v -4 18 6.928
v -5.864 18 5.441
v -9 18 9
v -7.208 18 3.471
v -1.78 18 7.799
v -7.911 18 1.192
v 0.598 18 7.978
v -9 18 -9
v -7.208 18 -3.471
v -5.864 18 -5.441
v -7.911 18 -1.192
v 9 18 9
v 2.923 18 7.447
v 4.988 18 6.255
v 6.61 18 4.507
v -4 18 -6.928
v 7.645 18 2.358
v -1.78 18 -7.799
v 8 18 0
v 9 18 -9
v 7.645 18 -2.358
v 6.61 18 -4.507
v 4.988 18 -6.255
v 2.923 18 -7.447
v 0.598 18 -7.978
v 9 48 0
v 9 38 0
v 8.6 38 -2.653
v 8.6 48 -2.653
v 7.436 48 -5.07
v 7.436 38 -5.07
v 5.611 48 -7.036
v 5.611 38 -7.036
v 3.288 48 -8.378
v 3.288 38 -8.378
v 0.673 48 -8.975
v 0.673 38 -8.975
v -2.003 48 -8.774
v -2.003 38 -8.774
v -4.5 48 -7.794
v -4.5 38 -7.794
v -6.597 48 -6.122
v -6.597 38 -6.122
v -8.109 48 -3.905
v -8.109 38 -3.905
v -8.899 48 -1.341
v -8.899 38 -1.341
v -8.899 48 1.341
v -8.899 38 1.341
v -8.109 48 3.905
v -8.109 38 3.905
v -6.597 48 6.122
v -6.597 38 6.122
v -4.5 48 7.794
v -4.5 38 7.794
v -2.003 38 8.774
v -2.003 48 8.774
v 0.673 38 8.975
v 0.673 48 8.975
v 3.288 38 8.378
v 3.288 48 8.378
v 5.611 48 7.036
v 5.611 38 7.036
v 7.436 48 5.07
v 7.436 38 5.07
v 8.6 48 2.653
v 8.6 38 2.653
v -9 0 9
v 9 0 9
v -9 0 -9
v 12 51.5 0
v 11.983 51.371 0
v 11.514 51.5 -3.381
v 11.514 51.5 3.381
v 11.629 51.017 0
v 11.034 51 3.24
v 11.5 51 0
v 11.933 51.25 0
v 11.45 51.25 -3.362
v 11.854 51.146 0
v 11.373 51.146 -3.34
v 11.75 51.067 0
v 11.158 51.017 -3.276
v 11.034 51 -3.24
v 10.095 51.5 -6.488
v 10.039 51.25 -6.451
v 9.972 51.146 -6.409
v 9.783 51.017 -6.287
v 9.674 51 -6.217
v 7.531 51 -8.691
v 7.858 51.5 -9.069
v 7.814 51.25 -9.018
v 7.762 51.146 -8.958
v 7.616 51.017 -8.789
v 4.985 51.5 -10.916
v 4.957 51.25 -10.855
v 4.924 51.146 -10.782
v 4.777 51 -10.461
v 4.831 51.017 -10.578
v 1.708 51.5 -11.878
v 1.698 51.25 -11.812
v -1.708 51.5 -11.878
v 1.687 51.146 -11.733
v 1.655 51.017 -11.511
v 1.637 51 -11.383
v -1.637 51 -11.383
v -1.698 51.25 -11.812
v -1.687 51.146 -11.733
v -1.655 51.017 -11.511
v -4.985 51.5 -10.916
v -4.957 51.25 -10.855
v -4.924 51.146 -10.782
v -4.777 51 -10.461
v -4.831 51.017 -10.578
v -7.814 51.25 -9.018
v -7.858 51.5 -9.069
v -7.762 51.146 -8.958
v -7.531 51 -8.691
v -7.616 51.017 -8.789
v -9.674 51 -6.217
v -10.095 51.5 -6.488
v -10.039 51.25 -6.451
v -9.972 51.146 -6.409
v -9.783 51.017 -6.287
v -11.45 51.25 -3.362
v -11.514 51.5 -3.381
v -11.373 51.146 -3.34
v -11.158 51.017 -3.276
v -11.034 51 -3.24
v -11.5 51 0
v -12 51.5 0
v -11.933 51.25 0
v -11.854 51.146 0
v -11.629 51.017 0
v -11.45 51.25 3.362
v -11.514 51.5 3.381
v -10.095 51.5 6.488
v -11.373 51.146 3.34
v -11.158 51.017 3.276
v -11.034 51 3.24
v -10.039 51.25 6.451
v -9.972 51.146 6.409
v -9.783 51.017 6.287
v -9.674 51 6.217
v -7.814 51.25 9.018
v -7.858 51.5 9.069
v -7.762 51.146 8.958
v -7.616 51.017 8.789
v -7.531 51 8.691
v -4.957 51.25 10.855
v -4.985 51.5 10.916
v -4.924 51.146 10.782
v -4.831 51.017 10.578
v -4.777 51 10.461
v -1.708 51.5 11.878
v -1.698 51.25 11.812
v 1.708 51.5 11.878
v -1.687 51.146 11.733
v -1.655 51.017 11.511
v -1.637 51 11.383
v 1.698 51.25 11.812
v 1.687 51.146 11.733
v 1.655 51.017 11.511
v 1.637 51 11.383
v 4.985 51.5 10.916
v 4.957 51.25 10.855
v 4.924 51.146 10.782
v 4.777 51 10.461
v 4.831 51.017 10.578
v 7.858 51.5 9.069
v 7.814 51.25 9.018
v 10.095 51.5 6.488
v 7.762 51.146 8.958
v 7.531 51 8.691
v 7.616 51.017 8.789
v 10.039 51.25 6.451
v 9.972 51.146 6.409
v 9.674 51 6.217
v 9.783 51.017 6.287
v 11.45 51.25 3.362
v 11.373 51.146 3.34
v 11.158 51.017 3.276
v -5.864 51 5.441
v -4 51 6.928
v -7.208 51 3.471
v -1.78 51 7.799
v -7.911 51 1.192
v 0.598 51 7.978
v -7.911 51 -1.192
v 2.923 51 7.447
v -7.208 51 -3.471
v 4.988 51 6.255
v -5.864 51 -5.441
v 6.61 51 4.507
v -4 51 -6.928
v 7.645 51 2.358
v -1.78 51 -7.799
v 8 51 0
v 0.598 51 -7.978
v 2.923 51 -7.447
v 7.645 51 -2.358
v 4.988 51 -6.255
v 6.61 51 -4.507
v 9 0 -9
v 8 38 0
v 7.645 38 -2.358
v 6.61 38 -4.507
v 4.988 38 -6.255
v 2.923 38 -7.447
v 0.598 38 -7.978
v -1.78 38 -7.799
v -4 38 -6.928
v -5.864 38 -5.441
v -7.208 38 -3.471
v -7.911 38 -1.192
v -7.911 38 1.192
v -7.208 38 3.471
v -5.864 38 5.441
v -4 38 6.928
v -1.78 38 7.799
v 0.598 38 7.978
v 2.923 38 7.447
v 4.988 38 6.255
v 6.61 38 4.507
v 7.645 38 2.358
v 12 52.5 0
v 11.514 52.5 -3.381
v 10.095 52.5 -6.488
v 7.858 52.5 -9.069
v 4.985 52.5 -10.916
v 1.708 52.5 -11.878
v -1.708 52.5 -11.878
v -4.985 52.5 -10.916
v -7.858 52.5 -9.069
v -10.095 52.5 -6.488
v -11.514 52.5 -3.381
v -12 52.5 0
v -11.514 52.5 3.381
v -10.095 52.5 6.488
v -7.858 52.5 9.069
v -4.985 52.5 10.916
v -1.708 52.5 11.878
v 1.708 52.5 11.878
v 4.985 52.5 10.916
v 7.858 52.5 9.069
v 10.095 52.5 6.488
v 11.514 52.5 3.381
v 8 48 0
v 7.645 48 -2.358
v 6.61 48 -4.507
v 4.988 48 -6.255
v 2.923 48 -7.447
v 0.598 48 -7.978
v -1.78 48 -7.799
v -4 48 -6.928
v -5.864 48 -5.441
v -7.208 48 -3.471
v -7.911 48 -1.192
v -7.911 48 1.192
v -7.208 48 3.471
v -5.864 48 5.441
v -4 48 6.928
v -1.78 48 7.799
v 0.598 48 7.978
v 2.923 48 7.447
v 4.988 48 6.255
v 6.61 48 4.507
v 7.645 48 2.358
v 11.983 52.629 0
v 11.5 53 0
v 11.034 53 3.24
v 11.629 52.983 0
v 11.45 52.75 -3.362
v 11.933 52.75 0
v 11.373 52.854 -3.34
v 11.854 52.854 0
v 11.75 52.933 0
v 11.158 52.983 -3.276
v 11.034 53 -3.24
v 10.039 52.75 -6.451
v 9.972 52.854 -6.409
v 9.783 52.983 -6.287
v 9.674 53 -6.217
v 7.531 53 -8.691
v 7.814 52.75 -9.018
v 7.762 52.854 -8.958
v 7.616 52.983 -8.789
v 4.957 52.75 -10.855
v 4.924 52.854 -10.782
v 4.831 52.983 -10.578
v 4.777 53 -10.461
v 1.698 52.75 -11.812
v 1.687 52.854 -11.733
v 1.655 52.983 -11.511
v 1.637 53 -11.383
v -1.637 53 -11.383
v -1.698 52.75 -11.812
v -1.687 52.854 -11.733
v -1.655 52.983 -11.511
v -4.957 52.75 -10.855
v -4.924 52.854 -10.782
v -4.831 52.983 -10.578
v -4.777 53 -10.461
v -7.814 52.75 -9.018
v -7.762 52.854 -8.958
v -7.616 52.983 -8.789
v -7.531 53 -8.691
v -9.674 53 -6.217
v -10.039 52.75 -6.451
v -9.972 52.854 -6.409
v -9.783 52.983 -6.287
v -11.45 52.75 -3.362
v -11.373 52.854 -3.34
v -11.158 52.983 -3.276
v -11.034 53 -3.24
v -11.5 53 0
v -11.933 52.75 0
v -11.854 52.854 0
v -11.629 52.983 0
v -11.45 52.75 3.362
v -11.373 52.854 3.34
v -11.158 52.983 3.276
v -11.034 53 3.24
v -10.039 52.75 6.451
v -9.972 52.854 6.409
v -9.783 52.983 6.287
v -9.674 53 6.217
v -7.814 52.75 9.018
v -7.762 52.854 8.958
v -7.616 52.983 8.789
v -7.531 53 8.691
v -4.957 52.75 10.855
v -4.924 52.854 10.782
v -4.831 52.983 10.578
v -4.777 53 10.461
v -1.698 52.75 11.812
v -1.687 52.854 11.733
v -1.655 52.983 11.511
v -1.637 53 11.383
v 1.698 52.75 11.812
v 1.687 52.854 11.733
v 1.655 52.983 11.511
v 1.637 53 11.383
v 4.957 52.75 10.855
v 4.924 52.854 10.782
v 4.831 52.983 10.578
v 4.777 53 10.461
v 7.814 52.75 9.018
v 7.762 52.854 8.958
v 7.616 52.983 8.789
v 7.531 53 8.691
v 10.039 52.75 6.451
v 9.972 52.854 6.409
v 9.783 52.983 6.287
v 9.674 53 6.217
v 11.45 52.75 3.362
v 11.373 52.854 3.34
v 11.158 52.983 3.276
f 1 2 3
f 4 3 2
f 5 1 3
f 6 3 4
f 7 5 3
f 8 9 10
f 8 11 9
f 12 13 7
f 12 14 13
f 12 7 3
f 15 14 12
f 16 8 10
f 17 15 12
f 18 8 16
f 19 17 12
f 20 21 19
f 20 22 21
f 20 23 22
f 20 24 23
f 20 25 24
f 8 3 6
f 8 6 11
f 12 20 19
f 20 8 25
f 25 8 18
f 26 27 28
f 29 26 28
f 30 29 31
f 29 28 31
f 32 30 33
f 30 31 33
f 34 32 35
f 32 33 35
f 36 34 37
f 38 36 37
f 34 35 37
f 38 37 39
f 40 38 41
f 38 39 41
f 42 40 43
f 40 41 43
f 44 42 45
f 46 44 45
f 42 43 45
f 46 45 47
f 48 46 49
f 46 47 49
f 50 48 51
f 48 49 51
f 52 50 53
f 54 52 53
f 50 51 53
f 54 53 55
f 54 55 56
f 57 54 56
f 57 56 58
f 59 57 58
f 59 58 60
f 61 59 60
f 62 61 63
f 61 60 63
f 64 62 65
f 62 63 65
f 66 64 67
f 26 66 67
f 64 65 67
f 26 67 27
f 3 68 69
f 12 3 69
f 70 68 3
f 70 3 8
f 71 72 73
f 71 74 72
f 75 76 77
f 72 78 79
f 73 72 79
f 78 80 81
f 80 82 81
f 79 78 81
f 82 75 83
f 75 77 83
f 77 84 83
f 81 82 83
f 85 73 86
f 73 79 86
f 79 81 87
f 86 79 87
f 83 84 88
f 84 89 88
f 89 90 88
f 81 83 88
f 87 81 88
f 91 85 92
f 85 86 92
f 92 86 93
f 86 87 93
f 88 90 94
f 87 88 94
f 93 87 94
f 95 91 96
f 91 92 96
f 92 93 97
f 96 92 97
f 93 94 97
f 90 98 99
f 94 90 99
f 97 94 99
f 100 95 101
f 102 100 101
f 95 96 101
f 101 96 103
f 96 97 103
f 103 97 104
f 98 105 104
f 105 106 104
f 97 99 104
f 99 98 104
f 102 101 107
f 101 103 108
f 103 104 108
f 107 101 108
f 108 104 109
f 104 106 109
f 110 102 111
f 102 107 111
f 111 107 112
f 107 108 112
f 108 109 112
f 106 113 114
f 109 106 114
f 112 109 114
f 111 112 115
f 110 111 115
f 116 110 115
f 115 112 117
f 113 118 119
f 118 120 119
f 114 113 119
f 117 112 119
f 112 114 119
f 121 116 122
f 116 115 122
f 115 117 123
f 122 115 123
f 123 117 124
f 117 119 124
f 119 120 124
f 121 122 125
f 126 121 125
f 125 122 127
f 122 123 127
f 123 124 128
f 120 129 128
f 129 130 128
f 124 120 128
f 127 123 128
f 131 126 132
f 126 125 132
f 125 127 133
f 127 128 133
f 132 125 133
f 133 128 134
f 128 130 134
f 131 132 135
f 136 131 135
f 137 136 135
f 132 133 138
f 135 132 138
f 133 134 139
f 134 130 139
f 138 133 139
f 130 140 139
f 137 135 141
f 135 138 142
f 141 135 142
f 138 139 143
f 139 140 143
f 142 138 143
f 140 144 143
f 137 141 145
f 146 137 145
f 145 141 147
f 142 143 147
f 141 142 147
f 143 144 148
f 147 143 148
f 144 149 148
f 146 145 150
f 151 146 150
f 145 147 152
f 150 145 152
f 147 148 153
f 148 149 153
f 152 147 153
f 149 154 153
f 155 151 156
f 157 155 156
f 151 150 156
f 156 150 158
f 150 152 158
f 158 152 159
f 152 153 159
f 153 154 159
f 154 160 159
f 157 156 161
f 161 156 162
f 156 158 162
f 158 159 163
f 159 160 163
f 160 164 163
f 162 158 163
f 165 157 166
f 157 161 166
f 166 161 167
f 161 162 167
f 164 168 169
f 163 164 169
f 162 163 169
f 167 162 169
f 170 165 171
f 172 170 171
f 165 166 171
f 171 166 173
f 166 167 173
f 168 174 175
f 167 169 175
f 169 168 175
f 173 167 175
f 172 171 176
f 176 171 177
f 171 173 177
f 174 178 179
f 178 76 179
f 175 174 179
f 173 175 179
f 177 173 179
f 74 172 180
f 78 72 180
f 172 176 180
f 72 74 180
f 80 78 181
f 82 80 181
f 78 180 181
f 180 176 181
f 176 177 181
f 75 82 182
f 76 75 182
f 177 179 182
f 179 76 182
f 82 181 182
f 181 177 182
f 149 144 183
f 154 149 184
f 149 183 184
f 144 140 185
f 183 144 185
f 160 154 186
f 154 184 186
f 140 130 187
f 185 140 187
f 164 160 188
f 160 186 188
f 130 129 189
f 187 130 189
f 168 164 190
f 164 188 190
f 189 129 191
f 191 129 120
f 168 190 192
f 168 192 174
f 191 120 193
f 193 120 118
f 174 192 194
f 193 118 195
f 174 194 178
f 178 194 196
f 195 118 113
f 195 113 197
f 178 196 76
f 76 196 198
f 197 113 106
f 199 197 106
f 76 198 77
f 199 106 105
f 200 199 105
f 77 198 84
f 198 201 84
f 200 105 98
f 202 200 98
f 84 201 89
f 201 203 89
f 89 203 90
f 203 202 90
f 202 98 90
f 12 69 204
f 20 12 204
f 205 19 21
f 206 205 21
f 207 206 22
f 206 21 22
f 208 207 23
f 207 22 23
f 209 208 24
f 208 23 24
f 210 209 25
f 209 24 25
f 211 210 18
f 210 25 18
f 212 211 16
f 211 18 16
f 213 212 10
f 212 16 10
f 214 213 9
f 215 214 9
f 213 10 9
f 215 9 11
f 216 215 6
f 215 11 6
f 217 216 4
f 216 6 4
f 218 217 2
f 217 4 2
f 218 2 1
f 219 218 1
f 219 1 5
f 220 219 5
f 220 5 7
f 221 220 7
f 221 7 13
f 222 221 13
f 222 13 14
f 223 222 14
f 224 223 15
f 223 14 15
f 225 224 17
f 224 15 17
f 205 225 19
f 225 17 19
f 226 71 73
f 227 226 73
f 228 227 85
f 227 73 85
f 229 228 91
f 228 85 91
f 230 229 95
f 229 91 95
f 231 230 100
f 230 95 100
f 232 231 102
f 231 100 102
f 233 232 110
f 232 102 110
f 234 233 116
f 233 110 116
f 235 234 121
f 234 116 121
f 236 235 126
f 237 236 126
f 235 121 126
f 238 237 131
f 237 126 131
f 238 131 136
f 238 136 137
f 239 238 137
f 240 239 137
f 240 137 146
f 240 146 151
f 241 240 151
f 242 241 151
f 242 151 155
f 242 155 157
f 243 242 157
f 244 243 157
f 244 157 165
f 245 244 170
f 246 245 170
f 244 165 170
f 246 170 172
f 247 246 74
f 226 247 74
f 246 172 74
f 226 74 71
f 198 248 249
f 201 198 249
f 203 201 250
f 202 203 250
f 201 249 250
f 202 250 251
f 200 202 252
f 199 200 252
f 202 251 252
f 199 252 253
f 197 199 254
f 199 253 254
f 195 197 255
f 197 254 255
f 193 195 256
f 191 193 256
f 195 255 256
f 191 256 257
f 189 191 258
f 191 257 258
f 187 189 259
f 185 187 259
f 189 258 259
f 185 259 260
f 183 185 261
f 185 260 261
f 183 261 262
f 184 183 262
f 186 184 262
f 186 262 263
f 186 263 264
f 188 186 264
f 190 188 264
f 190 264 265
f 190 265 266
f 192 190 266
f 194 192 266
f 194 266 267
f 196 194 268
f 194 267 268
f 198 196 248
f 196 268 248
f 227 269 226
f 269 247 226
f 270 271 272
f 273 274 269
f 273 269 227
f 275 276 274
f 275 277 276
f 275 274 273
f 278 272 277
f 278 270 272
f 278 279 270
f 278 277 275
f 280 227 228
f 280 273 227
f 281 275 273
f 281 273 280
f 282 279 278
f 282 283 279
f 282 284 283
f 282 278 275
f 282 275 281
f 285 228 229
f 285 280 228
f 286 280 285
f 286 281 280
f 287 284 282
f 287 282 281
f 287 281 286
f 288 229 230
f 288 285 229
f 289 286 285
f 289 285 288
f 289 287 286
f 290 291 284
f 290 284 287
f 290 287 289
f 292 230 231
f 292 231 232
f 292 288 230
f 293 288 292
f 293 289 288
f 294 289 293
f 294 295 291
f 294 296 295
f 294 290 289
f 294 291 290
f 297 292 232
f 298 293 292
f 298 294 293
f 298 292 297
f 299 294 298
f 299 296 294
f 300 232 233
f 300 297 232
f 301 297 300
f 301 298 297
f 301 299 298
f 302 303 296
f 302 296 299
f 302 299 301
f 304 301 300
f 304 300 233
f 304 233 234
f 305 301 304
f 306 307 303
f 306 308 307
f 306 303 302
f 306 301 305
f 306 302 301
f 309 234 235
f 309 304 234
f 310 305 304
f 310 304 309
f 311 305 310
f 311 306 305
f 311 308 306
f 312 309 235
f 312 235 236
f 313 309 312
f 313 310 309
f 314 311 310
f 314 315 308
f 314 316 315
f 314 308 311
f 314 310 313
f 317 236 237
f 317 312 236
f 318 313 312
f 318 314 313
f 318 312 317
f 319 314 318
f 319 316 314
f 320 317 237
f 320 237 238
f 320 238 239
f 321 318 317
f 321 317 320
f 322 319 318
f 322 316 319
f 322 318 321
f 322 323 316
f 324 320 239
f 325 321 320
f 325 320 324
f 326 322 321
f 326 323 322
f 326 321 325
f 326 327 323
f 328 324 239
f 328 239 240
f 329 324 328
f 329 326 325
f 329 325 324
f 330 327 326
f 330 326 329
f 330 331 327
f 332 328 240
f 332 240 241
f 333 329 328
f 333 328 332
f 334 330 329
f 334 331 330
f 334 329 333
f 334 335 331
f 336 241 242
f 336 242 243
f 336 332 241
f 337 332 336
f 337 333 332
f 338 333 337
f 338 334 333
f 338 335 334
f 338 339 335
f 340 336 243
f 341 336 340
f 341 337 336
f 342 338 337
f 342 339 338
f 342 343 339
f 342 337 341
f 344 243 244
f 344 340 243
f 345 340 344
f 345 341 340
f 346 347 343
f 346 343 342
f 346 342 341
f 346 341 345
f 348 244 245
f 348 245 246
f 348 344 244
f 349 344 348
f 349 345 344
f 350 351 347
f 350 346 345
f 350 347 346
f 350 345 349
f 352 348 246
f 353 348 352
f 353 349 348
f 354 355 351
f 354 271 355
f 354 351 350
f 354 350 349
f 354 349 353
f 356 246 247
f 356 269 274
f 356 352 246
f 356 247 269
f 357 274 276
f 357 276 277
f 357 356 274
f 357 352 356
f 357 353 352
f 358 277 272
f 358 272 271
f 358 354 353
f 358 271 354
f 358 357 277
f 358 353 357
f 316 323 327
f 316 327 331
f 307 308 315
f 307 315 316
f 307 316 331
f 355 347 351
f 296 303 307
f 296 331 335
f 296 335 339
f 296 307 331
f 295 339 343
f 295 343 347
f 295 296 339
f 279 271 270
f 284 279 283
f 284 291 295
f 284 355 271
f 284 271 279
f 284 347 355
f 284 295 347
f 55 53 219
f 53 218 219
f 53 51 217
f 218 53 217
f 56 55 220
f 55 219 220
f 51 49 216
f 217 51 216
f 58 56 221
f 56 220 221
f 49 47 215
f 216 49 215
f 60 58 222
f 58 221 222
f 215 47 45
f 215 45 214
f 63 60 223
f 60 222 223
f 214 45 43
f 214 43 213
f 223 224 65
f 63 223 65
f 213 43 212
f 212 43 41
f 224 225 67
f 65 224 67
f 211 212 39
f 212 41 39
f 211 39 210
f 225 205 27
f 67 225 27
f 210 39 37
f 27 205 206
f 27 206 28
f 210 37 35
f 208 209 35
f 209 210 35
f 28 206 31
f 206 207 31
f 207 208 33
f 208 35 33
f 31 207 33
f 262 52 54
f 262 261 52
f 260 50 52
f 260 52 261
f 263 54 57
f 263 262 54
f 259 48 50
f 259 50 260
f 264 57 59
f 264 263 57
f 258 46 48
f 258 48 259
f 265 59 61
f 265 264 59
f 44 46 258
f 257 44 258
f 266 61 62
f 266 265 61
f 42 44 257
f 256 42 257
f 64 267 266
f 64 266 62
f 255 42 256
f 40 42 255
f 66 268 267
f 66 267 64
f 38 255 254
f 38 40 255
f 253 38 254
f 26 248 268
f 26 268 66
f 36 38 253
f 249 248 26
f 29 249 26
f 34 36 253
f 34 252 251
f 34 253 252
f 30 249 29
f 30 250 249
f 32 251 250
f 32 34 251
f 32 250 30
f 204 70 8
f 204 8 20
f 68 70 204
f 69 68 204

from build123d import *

# Parameters (mm, degrees)
ESQUISSE1_W        = 18
ESQUISSE1_H        = 18
BOSS_EXTRU_1_DEPTH = 18
ESQUISSE2_R        = 8
BOSS_EXTRU_2_DEPTH = 20
ESQUISSE3_R        = 9
BOSS_EXTRU_3_DEPTH = 10
ESQUISSE4_R        = 8
BOSS_EXTRU_4_DEPTH = 3
ESQUISSE5_R        = 12
BOSS_EXTRU_5_DEPTH = 2
CONG_1_R           = 0.5
CONG_2_R           = 0.5


with BuildPart() as part:
    # Esquisse1 → Boss.-Extru.1 (new body)
    with BuildSketch(Plane(origin=(0, 0, 0), x_dir=(1, 0, 0), z_dir=(0, 1, 0))):
        Rectangle(ESQUISSE1_W, ESQUISSE1_H)
    extrude(amount=BOSS_EXTRU_1_DEPTH)

    # Esquisse2 → Boss.-Extru.2 (add)
    with BuildSketch(Plane(origin=(0, 18, 0), x_dir=(1, 0, 0), z_dir=(0, 1, 0))):
        Circle(ESQUISSE2_R)
    extrude(amount=BOSS_EXTRU_2_DEPTH)

    # Esquisse3 → Boss.-Extru.3 (add)
    with BuildSketch(Plane(origin=(0, 38, 0), x_dir=(1, 0, 0), z_dir=(0, 1, 0))):
        Circle(ESQUISSE3_R)
    extrude(amount=BOSS_EXTRU_3_DEPTH)

    # Esquisse4 → Boss.-Extru.4 (add)
    with BuildSketch(Plane(origin=(0, 48, 0), x_dir=(1, 0, 0), z_dir=(0, 1, 0))):
        Circle(ESQUISSE4_R)
    extrude(amount=BOSS_EXTRU_4_DEPTH)

    # Esquisse5 → Boss.-Extru.5 (add)
    with BuildSketch(Plane(origin=(0, 51, 0), x_dir=(1, 0, 0), z_dir=(0, 1, 0))):
        Circle(ESQUISSE5_R)
    extrude(amount=BOSS_EXTRU_5_DEPTH)

    # Congé1
    cong_1_edges = [part.edges().sort_by_distance(p)[0] for p in [
        (-12, 53, 0),
    ]]
    fillet(cong_1_edges, radius=CONG_1_R)

    # Congé2
    cong_2_edges = [part.edges().sort_by_distance(p)[0] for p in [
        (-12, 51, 0),
    ]]
    fillet(cong_2_edges, radius=CONG_2_R)


solid = part.part
